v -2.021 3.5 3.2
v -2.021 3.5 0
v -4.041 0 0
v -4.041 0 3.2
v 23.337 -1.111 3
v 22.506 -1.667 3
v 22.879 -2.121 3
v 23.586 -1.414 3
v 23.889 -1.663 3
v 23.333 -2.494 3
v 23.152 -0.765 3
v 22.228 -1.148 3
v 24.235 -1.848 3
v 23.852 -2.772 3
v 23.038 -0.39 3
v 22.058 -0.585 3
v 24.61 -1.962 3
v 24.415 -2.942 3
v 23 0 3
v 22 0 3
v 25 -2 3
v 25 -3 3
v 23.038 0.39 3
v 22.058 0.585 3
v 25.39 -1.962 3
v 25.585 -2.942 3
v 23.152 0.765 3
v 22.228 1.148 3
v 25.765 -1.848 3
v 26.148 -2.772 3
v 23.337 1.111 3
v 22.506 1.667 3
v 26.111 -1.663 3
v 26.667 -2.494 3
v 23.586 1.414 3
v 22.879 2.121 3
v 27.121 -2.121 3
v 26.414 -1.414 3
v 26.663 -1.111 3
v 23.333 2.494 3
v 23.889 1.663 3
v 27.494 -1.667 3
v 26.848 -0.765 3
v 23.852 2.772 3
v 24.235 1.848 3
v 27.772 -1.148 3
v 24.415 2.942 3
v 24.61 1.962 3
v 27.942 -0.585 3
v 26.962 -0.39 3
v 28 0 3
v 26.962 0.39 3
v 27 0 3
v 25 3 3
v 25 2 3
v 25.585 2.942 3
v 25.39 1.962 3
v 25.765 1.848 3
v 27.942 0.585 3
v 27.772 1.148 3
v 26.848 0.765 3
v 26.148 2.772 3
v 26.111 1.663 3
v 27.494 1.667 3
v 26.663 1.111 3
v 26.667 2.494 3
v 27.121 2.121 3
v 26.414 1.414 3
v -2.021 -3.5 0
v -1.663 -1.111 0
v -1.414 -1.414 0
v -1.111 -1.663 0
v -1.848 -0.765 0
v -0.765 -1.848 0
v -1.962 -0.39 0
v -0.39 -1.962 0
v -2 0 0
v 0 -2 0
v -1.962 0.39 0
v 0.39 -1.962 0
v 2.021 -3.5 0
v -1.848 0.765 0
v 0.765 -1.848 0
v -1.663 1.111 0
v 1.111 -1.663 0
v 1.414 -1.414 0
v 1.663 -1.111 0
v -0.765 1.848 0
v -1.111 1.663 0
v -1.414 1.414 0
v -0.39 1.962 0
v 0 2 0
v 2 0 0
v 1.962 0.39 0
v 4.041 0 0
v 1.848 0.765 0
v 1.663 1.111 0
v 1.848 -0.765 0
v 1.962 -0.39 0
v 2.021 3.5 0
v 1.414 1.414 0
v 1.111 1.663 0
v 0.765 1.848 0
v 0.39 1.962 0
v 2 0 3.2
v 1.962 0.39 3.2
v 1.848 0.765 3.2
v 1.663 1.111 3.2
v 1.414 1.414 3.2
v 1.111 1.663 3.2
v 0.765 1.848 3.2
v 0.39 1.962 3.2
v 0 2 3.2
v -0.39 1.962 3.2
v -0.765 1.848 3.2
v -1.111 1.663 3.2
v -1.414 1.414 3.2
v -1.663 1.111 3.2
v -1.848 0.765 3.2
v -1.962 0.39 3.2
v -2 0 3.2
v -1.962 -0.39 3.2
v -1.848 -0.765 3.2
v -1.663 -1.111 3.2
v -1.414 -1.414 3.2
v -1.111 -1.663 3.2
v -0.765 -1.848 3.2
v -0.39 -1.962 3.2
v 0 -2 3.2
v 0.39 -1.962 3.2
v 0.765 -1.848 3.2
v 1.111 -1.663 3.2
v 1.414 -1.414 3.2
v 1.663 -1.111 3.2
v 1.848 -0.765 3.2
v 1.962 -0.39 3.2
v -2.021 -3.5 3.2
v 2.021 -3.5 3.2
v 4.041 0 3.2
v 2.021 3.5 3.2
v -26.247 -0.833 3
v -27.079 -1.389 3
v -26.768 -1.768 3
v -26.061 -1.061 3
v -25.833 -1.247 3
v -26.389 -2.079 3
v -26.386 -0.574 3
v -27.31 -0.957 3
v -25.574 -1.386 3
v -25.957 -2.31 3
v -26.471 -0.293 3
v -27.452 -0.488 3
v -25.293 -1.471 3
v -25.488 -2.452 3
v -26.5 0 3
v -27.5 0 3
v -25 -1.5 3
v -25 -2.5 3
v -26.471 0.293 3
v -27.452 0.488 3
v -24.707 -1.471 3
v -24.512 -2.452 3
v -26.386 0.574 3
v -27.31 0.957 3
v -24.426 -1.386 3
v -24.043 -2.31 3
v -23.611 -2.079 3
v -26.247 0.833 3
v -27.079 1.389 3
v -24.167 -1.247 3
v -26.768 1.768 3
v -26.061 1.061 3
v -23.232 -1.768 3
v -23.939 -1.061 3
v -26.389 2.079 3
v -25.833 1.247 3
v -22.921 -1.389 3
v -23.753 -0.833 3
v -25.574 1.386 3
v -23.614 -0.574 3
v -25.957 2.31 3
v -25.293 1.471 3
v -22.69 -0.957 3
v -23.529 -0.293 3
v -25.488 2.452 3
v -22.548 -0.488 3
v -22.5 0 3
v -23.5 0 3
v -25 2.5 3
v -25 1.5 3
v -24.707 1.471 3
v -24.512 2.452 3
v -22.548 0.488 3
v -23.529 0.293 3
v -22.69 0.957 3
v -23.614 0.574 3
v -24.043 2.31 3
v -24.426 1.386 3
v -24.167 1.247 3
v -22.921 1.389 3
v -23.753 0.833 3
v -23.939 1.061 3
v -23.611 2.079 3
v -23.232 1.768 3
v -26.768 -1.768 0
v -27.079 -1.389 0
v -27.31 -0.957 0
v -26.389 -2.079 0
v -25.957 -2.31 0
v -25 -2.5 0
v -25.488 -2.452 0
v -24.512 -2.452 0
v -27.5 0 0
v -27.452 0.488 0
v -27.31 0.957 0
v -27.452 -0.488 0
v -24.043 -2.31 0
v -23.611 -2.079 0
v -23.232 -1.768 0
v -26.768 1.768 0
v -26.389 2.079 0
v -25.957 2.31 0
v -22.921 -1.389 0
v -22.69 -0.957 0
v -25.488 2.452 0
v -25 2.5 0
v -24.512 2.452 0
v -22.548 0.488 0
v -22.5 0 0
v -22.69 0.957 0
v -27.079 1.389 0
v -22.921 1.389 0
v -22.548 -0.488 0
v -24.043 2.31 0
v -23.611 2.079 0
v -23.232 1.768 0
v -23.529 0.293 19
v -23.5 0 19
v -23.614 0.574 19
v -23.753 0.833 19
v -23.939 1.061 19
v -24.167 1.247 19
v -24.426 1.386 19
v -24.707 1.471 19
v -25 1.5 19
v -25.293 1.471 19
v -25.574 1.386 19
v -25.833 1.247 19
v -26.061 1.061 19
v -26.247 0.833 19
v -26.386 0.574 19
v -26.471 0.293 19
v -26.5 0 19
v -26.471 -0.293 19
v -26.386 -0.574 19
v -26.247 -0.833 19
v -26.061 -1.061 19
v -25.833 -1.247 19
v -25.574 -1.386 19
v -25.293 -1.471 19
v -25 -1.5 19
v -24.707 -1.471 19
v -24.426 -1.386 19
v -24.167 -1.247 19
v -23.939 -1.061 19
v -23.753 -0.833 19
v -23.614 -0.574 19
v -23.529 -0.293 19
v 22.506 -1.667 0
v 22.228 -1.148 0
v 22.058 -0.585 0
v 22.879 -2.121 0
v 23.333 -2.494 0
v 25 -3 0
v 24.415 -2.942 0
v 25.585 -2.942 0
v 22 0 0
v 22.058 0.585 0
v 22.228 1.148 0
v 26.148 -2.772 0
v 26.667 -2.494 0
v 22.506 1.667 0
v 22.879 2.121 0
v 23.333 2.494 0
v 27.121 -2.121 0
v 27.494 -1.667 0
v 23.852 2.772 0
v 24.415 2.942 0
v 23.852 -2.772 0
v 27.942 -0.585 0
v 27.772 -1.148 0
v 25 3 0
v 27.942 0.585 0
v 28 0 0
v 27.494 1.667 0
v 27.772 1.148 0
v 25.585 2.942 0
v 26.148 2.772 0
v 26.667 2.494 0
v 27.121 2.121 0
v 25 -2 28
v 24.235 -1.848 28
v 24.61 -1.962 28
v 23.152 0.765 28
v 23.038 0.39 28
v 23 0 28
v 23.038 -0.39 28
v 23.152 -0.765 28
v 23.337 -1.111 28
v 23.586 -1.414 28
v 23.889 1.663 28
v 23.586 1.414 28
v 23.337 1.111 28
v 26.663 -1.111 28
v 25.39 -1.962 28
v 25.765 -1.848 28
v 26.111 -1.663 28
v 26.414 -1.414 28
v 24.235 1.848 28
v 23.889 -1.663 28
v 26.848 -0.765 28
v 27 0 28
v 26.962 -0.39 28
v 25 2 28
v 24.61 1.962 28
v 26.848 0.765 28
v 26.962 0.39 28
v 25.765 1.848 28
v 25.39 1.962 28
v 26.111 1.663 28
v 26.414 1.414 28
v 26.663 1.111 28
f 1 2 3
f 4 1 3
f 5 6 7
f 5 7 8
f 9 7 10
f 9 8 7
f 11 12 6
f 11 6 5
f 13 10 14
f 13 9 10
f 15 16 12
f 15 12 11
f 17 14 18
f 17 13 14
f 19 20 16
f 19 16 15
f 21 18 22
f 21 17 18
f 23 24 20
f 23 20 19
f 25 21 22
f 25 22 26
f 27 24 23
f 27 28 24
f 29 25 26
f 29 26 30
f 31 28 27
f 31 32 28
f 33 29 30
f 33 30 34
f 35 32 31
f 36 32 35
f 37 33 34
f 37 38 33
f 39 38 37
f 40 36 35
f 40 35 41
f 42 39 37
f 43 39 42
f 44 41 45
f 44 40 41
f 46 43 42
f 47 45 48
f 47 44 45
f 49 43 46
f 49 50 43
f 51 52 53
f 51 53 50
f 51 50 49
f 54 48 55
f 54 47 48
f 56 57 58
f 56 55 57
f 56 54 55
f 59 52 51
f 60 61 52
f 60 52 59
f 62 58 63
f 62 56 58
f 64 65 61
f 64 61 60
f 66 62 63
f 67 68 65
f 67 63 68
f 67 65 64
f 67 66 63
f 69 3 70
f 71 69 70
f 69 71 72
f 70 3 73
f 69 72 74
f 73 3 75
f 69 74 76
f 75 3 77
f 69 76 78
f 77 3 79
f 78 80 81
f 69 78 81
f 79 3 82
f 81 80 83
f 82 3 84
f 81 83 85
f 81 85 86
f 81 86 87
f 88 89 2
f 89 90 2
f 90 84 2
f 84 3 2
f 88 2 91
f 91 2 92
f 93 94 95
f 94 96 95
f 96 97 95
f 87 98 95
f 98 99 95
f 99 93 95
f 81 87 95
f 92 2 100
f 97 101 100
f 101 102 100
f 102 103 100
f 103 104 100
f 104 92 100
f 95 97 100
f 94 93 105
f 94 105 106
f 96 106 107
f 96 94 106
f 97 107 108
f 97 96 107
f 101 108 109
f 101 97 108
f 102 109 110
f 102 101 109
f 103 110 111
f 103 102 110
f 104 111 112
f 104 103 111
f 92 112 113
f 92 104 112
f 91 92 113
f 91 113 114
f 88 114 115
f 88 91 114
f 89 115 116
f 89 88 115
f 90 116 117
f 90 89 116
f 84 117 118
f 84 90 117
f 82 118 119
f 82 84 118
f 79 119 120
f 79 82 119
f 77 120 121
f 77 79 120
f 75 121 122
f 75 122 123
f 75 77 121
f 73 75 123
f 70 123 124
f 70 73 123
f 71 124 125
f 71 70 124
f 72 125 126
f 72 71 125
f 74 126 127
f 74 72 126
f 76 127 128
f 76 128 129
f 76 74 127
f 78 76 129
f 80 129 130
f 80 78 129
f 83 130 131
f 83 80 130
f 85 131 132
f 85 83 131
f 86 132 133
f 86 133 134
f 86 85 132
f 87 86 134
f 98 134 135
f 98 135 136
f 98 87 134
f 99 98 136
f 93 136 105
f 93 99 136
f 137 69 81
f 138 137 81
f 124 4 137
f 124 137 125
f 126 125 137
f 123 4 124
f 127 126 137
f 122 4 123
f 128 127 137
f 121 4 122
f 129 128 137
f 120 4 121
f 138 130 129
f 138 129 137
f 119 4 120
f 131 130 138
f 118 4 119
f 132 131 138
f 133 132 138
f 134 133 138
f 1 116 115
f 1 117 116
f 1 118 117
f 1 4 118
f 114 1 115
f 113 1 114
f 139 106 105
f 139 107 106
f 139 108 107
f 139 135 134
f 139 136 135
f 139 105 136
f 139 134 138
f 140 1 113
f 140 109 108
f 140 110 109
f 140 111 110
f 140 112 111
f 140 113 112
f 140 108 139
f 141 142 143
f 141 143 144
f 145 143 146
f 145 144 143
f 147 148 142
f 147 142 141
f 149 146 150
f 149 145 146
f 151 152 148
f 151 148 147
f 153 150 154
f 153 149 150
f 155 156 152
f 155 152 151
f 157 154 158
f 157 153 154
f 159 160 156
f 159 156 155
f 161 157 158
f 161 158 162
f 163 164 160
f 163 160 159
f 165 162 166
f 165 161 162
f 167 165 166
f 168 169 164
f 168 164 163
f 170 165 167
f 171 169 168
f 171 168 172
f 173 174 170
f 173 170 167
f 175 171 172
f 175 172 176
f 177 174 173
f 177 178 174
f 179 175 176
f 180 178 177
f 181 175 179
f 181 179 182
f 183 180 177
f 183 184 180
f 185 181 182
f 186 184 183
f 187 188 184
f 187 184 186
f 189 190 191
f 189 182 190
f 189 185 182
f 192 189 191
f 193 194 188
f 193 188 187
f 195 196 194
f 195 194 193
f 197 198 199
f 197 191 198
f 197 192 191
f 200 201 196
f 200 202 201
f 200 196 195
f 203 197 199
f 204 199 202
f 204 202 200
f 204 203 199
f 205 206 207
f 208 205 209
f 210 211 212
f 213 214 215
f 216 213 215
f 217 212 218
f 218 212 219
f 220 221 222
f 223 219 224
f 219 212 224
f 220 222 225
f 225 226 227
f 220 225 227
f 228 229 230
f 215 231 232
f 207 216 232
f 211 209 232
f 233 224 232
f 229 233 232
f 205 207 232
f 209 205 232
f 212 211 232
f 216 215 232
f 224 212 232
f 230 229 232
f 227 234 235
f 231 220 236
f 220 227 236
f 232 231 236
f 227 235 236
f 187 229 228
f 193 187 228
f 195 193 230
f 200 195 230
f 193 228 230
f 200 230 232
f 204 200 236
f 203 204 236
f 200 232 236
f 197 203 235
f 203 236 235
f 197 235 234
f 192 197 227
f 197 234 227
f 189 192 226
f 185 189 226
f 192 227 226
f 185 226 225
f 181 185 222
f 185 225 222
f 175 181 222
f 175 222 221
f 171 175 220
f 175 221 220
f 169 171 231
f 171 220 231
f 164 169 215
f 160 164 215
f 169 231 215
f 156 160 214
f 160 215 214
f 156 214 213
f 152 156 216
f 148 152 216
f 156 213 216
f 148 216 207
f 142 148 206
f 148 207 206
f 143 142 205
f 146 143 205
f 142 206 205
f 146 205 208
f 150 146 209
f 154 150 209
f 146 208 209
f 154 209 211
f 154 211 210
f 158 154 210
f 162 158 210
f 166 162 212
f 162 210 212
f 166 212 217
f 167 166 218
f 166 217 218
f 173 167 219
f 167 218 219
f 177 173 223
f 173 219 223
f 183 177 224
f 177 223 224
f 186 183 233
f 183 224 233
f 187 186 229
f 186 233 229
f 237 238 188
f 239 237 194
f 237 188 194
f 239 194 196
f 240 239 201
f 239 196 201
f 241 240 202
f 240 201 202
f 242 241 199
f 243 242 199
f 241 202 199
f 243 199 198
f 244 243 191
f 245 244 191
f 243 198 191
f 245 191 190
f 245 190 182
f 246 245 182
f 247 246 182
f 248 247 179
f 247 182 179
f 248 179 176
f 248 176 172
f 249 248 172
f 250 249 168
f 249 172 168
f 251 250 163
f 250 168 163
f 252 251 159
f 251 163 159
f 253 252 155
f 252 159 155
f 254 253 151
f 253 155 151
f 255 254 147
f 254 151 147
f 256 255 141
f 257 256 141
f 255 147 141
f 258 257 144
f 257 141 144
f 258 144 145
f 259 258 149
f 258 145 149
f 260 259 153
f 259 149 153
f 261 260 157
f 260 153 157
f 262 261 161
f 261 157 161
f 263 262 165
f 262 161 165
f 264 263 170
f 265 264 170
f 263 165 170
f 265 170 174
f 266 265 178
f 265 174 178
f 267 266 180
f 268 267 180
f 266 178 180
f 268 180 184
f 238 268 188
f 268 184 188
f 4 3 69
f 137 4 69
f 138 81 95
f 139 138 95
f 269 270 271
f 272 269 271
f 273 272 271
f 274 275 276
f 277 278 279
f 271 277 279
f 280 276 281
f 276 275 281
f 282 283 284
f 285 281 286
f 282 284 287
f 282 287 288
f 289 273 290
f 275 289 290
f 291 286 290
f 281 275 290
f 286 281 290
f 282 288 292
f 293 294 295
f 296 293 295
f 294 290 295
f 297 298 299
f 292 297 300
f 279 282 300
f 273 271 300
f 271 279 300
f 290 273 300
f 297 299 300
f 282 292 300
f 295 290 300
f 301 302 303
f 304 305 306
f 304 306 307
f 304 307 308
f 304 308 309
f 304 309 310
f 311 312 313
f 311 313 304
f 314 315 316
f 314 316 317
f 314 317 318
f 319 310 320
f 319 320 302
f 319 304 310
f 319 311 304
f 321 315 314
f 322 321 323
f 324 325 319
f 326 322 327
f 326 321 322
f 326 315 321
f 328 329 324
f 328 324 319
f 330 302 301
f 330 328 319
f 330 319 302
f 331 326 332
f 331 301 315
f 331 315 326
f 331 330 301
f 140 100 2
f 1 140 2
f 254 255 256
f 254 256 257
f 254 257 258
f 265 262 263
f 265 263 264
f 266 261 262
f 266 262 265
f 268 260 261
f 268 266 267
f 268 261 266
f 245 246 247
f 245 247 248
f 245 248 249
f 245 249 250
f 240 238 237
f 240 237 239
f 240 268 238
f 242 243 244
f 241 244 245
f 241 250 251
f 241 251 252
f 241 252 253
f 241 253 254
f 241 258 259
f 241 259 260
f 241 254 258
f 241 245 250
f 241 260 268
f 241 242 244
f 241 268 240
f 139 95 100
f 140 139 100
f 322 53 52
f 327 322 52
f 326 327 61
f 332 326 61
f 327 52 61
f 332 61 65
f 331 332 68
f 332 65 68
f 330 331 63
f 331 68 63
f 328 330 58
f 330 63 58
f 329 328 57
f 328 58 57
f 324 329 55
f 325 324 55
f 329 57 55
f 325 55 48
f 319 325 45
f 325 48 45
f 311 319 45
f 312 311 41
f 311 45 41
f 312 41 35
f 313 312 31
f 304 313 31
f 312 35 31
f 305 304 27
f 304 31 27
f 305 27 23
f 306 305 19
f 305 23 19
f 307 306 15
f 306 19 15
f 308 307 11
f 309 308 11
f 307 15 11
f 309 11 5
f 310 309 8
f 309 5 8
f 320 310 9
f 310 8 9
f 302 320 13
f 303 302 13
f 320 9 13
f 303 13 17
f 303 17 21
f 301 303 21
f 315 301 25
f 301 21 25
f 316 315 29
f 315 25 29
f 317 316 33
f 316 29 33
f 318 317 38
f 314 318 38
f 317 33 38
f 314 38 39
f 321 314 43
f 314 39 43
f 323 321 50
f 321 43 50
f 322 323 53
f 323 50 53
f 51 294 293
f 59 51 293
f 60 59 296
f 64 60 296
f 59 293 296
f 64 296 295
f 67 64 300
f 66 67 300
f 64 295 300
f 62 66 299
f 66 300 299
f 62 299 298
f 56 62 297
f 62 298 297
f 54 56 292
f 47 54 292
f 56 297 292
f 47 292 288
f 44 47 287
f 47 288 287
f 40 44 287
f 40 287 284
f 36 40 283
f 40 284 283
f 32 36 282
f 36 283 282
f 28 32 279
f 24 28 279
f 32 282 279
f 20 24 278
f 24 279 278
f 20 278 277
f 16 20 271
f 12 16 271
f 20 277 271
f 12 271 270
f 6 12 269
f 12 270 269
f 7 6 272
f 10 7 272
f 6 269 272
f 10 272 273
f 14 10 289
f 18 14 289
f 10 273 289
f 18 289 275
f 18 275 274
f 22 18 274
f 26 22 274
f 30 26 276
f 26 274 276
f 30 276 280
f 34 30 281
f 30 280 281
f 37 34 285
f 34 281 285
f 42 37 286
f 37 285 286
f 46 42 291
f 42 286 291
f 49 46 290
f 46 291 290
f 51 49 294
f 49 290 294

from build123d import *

# Parameters (mm, degrees)
F0_R     = 2.5
F1_DEPTH = 3
F0_R_2   = 3
F2_DEPTH = 3
F3_R     = 1.5
F4_DEPTH = 16
F5_R     = 2
F6_DEPTH = 25
F7_R     = 2
F8_DEPTH = 3.2


with BuildPart() as f1:
    # F0 (on Top) → F1 (new body)
    with BuildSketch(Plane.XY):
        with Locations((-25, 0)):
            Circle(F0_R)
    extrude(amount=F1_DEPTH)

    # F3 (on face) → F4 (join)
    with BuildSketch(Plane.XY.offset(3)):
        with Locations((-25, 0)):
            Circle(F3_R)
    extrude(amount=F4_DEPTH)


with BuildPart() as f2:
    # F0 (on Top) → F2 (new body)
    with BuildSketch(Plane.XY):
        with Locations((25, 0)):
            Circle(F0_R_2)
    extrude(amount=F2_DEPTH)

    # F5 (on face) → F6 (join)
    with BuildSketch(Plane.XY.offset(3)):
        with Locations((25, 0)):
            Circle(F5_R)
    extrude(amount=F6_DEPTH)


with BuildPart() as f8:
    # F7 (on Top) → F8 (new body)
    with BuildSketch(Plane.XY):
        Polygon((2.020726, 3.5), (-2.020726, 3.5), (-4.041452, 0), (-2.020726, -3.5), (2.020726, -3.5), (4.041452, 0), align=None)
        Circle(F7_R, mode=Mode.SUBTRACT)
    extrude(amount=F8_DEPTH)


solid = Compound([f1.part, f2.part, f8.part])
